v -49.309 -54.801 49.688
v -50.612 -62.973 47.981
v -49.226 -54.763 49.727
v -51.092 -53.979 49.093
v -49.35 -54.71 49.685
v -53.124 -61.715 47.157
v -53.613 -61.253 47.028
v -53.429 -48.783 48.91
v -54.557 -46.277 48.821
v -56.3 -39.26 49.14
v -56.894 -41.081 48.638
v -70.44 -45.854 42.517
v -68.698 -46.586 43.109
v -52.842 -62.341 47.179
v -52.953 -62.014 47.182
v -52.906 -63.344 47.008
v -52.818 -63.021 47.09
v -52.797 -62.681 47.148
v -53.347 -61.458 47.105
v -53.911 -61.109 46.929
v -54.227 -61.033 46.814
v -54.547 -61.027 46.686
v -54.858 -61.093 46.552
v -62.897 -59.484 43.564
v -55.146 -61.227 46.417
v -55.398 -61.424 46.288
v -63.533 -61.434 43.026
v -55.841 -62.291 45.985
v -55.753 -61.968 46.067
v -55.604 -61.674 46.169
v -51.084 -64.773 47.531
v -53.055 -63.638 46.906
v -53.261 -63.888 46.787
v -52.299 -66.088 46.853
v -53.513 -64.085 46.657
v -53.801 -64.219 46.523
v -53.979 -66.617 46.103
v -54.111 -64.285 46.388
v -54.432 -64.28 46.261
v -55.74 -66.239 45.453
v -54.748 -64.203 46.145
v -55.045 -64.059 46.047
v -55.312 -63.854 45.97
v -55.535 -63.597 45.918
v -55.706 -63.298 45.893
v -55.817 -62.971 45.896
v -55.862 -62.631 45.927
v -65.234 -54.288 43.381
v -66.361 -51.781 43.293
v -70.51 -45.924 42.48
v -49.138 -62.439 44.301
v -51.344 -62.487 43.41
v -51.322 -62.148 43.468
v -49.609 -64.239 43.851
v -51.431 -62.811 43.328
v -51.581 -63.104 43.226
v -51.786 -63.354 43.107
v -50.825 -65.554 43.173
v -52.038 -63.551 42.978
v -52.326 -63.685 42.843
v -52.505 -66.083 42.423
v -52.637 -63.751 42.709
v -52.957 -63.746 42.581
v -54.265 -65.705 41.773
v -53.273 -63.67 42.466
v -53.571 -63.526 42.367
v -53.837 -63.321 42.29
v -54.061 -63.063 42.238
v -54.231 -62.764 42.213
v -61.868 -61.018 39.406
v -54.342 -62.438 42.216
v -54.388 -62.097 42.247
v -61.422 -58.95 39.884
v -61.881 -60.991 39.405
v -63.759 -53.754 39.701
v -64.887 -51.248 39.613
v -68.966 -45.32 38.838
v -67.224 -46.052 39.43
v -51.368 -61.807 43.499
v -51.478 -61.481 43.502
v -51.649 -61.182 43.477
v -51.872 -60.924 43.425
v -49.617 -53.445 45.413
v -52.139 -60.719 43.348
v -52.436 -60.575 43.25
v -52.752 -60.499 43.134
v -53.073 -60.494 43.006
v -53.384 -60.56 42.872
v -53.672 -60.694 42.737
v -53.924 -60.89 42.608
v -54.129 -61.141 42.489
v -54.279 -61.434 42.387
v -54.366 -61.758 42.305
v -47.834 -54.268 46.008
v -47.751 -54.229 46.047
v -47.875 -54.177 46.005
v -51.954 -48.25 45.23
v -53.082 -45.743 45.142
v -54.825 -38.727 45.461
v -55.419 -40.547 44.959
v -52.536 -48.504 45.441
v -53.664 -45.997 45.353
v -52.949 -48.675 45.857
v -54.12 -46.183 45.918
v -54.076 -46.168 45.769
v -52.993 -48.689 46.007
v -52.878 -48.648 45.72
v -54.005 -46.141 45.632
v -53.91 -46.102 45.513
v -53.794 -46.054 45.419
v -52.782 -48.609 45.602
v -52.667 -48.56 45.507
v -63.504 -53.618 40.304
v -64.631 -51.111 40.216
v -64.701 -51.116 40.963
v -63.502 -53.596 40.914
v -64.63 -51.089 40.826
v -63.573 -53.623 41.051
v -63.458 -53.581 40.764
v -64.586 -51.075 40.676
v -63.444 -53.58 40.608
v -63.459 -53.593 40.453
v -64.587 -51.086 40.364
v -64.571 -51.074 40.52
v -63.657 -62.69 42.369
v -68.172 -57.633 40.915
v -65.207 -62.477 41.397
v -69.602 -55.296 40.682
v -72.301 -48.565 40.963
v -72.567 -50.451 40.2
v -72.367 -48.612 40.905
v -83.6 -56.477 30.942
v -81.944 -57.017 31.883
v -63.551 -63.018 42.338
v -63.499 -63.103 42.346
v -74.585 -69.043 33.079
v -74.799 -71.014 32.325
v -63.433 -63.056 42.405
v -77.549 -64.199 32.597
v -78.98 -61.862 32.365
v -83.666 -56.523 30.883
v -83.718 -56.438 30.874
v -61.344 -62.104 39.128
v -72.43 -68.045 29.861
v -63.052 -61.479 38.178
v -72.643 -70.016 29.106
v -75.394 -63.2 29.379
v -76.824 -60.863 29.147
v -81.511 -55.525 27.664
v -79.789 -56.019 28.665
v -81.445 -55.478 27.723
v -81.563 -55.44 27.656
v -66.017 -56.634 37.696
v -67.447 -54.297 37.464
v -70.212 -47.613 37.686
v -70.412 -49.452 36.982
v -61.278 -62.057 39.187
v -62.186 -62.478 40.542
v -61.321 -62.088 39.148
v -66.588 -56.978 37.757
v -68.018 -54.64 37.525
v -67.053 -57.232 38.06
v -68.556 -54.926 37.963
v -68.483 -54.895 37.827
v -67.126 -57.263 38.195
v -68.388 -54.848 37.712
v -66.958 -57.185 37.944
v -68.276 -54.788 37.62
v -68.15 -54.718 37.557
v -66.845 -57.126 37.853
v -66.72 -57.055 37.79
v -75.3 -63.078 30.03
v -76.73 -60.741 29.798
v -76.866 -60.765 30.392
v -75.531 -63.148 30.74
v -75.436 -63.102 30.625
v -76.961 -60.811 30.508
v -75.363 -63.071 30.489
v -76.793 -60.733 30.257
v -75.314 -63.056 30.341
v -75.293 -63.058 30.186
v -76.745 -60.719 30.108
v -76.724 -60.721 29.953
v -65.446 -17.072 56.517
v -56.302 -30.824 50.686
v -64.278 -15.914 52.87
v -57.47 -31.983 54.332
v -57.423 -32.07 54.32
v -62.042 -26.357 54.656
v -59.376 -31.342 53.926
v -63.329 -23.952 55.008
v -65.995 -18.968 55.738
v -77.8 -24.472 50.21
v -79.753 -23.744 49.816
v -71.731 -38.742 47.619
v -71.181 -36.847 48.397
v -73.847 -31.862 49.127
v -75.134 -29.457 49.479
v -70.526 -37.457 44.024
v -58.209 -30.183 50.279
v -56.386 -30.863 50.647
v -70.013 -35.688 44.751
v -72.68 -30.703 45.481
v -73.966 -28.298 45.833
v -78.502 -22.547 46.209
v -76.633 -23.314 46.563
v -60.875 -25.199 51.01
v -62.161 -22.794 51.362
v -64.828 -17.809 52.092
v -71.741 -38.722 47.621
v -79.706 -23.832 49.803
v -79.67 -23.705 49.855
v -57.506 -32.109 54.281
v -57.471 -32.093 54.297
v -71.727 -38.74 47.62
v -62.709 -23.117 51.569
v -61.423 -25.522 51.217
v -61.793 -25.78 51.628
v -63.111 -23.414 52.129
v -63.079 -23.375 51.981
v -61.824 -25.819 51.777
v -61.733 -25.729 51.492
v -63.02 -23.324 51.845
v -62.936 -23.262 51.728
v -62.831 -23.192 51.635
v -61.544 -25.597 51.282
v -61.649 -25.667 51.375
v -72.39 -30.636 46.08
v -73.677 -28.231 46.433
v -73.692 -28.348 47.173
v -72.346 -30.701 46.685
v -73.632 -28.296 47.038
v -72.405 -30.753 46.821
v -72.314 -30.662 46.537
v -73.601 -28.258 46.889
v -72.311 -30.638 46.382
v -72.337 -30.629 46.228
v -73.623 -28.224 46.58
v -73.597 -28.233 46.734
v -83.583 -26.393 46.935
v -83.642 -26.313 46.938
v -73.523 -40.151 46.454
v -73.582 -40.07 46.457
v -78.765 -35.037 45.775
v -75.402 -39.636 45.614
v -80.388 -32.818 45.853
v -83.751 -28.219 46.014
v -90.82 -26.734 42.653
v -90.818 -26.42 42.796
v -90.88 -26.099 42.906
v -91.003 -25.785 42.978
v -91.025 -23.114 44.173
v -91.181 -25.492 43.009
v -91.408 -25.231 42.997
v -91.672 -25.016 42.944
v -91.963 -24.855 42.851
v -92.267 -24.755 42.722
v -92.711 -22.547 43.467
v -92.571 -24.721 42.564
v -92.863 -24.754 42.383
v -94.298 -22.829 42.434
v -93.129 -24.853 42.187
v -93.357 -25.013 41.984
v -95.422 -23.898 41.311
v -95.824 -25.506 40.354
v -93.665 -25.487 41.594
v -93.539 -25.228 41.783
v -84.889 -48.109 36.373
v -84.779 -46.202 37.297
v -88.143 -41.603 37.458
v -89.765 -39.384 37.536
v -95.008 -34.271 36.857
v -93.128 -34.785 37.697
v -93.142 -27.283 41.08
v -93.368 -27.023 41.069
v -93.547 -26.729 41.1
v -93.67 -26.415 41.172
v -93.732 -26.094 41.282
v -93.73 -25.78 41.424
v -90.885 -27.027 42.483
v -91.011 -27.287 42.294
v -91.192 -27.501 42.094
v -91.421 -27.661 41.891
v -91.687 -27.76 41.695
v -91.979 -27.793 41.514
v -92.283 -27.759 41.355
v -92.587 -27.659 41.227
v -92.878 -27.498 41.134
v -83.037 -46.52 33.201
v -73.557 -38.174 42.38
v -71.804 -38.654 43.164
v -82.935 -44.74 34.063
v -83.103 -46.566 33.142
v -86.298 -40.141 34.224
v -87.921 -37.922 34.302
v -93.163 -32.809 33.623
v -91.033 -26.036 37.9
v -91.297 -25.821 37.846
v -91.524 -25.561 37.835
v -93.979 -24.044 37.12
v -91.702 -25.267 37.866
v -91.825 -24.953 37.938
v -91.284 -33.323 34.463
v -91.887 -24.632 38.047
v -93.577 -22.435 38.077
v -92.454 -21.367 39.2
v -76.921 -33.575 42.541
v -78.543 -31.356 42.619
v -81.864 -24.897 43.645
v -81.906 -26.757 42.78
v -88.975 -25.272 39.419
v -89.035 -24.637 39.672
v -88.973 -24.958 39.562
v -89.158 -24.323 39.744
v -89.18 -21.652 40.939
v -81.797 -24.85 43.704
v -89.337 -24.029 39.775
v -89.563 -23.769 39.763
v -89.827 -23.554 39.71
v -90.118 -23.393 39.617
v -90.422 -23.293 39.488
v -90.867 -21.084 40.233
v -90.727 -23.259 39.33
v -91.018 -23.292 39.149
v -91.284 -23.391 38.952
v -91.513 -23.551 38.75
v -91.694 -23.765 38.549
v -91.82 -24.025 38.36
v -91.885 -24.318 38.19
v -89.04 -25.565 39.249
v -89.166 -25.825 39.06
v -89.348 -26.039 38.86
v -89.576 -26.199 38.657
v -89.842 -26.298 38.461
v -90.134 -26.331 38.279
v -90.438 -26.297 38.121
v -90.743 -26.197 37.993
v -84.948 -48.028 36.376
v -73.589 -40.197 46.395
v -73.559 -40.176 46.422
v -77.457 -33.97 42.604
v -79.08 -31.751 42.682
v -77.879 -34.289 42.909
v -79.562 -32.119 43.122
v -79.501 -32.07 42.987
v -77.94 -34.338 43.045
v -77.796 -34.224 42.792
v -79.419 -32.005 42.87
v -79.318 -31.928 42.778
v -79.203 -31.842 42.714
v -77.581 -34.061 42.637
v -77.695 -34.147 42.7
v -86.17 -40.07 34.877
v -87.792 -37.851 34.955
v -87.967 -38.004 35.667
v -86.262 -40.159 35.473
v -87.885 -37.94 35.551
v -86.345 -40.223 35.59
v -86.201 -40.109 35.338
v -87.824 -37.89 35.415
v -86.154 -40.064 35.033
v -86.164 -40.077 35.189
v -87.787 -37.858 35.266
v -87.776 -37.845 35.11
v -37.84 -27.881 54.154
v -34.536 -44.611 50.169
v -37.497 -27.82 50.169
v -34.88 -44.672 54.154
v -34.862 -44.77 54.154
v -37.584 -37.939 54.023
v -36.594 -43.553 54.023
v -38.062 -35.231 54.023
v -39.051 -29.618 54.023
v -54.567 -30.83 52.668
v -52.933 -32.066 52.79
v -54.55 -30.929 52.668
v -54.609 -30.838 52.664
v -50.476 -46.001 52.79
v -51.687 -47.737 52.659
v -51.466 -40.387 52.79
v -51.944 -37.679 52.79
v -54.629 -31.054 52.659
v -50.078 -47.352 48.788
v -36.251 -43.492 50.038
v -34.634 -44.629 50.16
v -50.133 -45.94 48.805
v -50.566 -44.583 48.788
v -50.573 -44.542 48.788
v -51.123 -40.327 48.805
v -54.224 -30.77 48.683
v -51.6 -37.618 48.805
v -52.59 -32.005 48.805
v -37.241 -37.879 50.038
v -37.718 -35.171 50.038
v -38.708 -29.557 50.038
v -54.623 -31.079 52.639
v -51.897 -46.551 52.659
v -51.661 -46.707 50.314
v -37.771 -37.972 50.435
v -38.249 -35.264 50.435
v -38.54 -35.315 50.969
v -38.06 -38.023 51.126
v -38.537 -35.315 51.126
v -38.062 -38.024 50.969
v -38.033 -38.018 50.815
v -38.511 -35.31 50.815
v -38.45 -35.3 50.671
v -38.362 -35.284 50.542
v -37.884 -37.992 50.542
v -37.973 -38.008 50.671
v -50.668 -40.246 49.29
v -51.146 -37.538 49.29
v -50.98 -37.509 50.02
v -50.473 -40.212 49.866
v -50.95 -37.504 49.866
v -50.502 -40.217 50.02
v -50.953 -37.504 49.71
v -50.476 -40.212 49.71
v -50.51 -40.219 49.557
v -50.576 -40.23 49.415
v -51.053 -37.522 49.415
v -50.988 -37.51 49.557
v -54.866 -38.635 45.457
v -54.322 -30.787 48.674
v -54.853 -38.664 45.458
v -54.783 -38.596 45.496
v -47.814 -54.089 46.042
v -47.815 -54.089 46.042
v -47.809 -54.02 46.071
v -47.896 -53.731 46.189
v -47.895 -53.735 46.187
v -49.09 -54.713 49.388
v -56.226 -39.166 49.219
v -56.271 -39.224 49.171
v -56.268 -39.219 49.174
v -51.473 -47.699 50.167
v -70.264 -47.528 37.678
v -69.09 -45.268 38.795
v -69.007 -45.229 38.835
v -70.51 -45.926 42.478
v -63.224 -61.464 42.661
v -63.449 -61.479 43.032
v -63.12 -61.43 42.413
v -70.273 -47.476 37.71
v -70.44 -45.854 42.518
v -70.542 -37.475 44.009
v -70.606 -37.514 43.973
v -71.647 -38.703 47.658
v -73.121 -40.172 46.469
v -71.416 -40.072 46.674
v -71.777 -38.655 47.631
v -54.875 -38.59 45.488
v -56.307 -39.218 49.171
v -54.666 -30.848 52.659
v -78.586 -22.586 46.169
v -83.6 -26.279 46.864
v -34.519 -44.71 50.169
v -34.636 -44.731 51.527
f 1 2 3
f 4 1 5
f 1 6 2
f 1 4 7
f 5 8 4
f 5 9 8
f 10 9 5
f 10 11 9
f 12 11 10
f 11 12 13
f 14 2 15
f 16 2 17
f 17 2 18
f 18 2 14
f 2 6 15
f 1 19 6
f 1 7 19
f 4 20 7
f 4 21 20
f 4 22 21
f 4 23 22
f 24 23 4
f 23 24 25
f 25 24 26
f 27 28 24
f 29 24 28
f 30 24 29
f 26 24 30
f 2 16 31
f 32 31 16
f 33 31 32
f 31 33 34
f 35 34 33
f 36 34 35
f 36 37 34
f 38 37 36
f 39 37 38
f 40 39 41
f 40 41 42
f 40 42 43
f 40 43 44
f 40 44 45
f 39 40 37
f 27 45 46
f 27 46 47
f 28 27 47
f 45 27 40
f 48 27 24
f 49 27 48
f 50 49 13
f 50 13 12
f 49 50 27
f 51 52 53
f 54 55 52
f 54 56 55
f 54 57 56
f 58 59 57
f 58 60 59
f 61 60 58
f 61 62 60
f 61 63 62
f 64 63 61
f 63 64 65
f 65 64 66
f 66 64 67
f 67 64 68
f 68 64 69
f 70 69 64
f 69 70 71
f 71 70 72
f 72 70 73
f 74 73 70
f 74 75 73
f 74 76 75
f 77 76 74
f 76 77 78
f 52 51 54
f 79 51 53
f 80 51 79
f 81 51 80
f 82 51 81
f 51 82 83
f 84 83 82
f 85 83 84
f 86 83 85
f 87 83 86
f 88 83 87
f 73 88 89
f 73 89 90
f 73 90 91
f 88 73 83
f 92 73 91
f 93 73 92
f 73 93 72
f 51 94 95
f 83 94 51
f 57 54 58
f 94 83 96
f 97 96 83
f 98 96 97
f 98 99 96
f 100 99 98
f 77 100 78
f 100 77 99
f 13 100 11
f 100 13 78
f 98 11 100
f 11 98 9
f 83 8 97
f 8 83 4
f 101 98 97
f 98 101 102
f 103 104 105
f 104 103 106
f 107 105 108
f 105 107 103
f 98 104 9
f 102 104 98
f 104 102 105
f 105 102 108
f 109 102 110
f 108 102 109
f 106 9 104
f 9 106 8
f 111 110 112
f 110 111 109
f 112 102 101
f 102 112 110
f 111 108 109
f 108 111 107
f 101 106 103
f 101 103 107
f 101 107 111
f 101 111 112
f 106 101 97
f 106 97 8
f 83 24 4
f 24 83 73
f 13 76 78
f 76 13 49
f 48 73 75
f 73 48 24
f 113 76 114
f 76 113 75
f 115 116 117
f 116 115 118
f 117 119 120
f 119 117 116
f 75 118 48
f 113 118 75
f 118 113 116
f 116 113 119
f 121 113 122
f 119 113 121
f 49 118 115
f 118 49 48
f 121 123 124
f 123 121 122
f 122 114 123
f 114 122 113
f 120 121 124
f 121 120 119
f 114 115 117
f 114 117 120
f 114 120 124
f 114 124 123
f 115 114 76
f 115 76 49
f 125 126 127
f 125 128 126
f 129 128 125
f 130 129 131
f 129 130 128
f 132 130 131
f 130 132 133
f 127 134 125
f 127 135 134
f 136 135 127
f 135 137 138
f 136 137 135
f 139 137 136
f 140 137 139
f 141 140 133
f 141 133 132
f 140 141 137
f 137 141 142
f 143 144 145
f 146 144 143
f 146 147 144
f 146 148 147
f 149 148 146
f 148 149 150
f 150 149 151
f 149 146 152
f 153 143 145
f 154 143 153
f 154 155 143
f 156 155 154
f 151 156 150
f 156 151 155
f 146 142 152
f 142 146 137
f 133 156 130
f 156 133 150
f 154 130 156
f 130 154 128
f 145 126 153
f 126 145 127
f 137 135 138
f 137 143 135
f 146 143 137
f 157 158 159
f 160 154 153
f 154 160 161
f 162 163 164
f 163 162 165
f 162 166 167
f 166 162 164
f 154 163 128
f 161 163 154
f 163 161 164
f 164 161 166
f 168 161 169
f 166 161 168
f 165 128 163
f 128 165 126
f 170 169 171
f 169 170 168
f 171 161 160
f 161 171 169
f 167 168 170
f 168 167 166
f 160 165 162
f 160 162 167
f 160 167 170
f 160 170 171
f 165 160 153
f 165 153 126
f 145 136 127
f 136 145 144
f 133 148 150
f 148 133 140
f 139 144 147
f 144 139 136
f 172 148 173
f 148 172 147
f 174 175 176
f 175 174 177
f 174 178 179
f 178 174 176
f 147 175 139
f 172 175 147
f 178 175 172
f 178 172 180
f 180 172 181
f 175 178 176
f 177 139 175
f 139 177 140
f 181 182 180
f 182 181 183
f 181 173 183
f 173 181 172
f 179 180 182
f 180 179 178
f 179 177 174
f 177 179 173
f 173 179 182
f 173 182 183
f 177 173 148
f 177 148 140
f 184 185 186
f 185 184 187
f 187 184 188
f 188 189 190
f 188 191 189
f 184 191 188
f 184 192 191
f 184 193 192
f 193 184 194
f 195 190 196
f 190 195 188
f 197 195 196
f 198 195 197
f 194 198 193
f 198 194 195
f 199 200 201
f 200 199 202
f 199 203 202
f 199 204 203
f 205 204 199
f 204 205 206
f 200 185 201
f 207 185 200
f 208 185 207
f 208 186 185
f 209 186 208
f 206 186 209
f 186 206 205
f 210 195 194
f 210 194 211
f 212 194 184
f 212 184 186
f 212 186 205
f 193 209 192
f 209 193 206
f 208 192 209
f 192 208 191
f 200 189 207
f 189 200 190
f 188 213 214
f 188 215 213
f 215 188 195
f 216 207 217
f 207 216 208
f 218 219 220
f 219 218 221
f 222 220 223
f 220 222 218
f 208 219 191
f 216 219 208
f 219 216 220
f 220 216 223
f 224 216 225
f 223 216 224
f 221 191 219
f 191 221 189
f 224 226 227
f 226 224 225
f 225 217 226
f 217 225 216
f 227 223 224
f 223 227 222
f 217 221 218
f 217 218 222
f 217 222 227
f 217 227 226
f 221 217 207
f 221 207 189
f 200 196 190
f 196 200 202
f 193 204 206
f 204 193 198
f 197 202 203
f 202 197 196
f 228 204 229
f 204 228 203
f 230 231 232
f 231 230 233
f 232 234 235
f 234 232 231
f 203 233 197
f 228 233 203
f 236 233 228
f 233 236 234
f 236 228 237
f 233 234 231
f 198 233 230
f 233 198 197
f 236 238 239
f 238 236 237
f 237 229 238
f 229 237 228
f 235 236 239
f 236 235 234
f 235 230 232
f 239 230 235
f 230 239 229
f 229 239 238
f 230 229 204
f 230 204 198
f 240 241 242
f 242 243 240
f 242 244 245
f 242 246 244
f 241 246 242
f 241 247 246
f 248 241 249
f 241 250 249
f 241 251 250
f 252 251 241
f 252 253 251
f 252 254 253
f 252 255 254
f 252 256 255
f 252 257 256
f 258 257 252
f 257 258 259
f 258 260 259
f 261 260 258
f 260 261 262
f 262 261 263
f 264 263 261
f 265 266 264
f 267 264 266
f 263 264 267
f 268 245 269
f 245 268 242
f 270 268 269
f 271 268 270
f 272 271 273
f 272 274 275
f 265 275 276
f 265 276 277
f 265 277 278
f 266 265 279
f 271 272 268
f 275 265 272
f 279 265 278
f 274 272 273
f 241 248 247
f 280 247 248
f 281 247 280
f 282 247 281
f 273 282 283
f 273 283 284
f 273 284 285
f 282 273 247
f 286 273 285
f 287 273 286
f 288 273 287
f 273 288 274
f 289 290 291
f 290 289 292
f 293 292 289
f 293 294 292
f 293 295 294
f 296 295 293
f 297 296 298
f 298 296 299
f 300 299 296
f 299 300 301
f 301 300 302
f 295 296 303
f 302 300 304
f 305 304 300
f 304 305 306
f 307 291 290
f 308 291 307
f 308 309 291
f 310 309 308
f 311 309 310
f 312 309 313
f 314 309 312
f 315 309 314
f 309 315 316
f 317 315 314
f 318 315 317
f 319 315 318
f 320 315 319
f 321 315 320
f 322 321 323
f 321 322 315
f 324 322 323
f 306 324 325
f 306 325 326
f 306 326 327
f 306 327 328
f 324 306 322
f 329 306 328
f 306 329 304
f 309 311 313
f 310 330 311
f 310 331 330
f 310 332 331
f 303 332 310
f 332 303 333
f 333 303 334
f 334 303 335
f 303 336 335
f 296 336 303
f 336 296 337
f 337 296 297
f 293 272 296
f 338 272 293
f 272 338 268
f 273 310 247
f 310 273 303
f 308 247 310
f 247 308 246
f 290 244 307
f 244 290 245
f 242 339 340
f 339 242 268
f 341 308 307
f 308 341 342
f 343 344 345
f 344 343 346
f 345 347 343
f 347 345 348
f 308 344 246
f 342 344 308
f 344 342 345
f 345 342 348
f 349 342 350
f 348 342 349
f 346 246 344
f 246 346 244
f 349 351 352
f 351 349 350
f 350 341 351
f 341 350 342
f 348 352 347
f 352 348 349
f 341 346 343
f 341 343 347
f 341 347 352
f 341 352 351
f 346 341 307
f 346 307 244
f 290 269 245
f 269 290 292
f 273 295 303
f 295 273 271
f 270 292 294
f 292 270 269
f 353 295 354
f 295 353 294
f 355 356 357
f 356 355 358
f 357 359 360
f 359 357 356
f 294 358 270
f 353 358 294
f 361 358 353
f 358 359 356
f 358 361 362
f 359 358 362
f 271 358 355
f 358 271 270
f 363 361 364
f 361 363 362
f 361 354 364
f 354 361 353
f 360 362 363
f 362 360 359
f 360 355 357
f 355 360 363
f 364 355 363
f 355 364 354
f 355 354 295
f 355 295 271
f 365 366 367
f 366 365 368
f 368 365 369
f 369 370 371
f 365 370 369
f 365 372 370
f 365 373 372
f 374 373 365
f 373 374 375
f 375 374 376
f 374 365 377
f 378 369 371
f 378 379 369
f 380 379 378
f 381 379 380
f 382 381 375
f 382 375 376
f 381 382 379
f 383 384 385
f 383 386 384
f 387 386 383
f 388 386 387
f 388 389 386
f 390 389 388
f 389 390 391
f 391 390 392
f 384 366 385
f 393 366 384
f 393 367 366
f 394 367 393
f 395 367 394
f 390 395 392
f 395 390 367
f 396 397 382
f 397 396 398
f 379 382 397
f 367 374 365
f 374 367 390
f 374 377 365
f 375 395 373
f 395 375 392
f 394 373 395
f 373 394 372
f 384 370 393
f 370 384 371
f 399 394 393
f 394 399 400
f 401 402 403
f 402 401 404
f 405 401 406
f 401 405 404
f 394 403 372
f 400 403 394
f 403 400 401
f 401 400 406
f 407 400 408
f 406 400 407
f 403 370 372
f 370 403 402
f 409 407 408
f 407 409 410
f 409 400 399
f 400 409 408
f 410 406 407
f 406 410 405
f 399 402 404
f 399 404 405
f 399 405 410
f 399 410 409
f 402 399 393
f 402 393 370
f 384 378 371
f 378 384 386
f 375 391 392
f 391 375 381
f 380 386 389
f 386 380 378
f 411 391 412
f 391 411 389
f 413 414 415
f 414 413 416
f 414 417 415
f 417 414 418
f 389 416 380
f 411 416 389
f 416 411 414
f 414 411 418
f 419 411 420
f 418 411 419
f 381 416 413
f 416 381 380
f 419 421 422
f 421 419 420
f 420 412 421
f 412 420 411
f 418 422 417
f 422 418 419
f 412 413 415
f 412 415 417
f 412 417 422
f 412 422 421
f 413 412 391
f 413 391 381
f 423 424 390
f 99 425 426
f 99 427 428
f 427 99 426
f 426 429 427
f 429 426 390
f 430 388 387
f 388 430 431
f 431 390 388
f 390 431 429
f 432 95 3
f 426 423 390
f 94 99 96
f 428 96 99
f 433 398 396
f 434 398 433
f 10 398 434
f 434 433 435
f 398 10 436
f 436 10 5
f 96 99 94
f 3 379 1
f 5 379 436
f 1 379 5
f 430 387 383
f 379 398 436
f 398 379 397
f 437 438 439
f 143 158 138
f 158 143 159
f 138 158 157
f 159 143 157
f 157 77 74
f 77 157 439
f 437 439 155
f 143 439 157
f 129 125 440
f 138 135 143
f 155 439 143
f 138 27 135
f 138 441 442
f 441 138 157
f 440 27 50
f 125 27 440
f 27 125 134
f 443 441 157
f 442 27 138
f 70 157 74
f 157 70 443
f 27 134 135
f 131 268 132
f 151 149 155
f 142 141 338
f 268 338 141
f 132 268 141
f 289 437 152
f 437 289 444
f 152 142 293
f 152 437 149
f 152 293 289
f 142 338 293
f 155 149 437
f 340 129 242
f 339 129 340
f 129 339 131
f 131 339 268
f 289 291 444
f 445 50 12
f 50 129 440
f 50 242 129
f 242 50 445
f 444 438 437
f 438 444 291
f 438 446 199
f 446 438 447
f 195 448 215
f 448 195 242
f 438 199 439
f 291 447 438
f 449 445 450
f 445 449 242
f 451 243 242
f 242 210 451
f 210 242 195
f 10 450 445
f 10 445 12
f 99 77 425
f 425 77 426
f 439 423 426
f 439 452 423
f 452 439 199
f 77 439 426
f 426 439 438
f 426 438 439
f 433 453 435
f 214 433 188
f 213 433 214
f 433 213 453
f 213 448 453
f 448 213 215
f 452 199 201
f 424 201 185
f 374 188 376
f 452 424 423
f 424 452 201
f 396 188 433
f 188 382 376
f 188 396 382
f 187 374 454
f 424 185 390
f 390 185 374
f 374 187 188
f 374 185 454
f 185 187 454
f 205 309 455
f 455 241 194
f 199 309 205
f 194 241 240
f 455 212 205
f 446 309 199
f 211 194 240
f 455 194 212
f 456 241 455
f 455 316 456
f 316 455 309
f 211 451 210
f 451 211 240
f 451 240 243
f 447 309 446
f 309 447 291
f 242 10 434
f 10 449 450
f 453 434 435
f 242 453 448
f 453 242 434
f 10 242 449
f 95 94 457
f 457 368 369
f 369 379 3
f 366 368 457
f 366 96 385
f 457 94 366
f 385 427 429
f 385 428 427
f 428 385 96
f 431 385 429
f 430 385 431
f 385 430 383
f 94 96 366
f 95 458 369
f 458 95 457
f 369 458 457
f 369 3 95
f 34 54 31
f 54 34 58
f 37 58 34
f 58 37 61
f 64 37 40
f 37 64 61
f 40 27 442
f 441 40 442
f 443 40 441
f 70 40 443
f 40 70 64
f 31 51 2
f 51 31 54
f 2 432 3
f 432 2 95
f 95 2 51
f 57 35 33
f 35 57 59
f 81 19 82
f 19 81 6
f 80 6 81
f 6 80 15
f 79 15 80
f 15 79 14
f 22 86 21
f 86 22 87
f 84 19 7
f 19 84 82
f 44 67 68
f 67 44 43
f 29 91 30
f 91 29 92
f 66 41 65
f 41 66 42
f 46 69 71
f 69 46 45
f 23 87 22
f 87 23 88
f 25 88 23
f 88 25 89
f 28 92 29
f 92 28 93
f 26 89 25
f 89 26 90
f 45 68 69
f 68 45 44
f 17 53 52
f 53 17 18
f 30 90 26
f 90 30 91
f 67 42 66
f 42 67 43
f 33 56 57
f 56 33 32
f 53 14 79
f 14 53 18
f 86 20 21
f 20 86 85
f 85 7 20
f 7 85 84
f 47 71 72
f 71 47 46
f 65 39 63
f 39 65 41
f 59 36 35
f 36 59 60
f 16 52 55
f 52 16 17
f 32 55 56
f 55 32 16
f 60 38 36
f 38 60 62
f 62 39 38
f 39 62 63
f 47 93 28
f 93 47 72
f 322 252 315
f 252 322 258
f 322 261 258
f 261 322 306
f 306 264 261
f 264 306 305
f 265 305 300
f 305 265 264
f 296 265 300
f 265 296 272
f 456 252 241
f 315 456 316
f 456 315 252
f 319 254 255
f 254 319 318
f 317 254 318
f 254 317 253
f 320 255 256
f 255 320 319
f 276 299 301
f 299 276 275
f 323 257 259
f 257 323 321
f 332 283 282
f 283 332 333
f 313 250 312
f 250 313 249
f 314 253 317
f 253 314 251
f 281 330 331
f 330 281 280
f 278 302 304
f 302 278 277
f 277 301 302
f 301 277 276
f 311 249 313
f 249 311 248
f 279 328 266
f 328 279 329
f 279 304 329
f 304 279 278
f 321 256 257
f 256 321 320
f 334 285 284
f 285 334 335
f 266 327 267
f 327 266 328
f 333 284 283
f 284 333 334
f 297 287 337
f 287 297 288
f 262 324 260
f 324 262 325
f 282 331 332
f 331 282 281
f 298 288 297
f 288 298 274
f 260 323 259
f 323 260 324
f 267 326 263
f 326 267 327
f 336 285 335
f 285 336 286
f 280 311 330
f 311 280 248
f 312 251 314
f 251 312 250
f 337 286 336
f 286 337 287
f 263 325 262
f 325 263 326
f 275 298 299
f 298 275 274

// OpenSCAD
union () {
  union () {
    union () {
      union () {
        translate ([-22, -36, -3]) {
          translate ([-36.42059678255161, -13.748592644796744, 45.42143047760381]) {
            rotate (a=25.0, v=[0, 0, 1]) {
              rotate (a=-23.000000000000004, v=[0, 1, 0]) {
                rotate (a=-1.9999999999999998, v=[1, 0, 0]) {
                  union () {
                    union () {
                      translate ([0, 7.825, 2]) {
                        cube ([17.15, 1.5, 4], center=true);
                      }
                      translate ([7.825, 0, 2]) {
                        cube ([1.5, 17.15, 4], center=true);
                      }
                      translate ([0, 0, 0]) {
                        hull () {
                          translate ([7.825, 0, 2]) {
                            cube ([1.5, 2.75, 4], center=true);
                          }
                          translate ([7.075, 0, 1]) {
                            rotate (a=90.0, v=[1, 0, 0]) {
                              cylinder ($fn=30, h=2.75, r=0.75, center=true);
                            }
                          }
                        }
                      }
                    }
                    mirror ([0, 1, 0]) {
                      mirror ([1, 0, 0]) {
                        union () {
                          translate ([0, 7.825, 2]) {
                            cube ([17.15, 1.5, 4], center=true);
                          }
                          translate ([7.825, 0, 2]) {
                            cube ([1.5, 17.15, 4], center=true);
                          }
                          translate ([0, 0, 0]) {
                            hull () {
                              translate ([7.825, 0, 2]) {
                                cube ([1.5, 2.75, 4], center=true);
                              }
                              translate ([7.075, 0, 1]) {
                                rotate (a=90.0, v=[1, 0, 0]) {
                                  cylinder ($fn=30, h=2.75, r=0.75, center=true);
                                }
                              }
                            }
                          }
                        }
                      }
                    }
                  }
                }
              }
            }
          }
        }
        translate ([-35, -45, -12]) {
          translate ([-36.42059678255161, -13.748592644796744, 45.42143047760381]) {
            rotate (a=34.99999999999999, v=[0, 0, 1]) {
              rotate (a=-36.0, v=[0, 1, 0]) {
                rotate (a=-6.0, v=[1, 0, 0]) {
                  union () {
                    union () {
                      translate ([0, 7.825, 2]) {
                        cube ([17.15, 1.5, 4], center=true);
                      }
                      translate ([7.825, 0, 2]) {
                        cube ([1.5, 17.15, 4], center=true);
                      }
                      translate ([0, 0, 0]) {
                        hull () {
                          translate ([7.825, 0, 2]) {
                            cube ([1.5, 2.75, 4], center=true);
                          }
                          translate ([7.075, 0, 1]) {
                            rotate (a=90.0, v=[1, 0, 0]) {
                              cylinder ($fn=30, h=2.75, r=0.75, center=true);
                            }
                          }
                        }
                      }
                    }
                    mirror ([0, 1, 0]) {
                      mirror ([1, 0, 0]) {
                        union () {
                          translate ([0, 7.825, 2]) {
                            cube ([17.15, 1.5, 4], center=true);
                          }
                          translate ([7.825, 0, 2]) {
                            cube ([1.5, 17.15, 4], center=true);
                          }
                          translate ([0, 0, 0]) {
                            hull () {
                              translate ([7.825, 0, 2]) {
                                cube ([1.5, 2.75, 4], center=true);
                              }
                              translate ([7.075, 0, 1]) {
                                rotate (a=90.0, v=[1, 0, 0]) {
                                  cylinder ($fn=30, h=2.75, r=0.75, center=true);
                                }
                              }
                            }
                          }
                        }
                      }
                    }
                  }
                }
              }
            }
          }
        }
        translate ([-31, -13, 3]) {
          translate ([-36.42059678255161, -13.748592644796744, 45.42143047760381]) {
            rotate (a=25.0, v=[0, 0, 1]) {
              rotate (a=-23.000000000000004, v=[0, 1, 0]) {
                rotate (a=7.999999999999999, v=[1, 0, 0]) {
                  union () {
                    union () {
                      translate ([0, 7.825, 2]) {
                        cube ([17.15, 1.5, 4], center=true);
                      }
                      translate ([7.825, 0, 2]) {
                        cube ([1.5, 17.15, 4], center=true);
                      }
                      translate ([0, 0, 0]) {
                        hull () {
                          translate ([7.825, 0, 2]) {
                            cube ([1.5, 2.75, 4], center=true);
                          }
                          translate ([7.075, 0, 1]) {
                            rotate (a=90.0, v=[1, 0, 0]) {
                              cylinder ($fn=30, h=2.75, r=0.75, center=true);
                            }
                          }
                        }
                      }
                    }
                    mirror ([0, 1, 0]) {
                      mirror ([1, 0, 0]) {
                        union () {
                          translate ([0, 7.825, 2]) {
                            cube ([17.15, 1.5, 4], center=true);
                          }
                          translate ([7.825, 0, 2]) {
                            cube ([1.5, 17.15, 4], center=true);
                          }
                          translate ([0, 0, 0]) {
                            hull () {
                              translate ([7.825, 0, 2]) {
                                cube ([1.5, 2.75, 4], center=true);
                              }
                              translate ([7.075, 0, 1]) {
                                rotate (a=90.0, v=[1, 0, 0]) {
                                  cylinder ($fn=30, h=2.75, r=0.75, center=true);
                                }
                              }
                            }
                          }
                        }
                      }
                    }
                  }
                }
              }
            }
          }
        }
        translate ([-46, -22, -7]) {
          translate ([-36.42059678255161, -13.748592644796744, 45.42143047760381]) {
            rotate (a=34.99999999999999, v=[0, 0, 1]) {
              rotate (a=-36.0, v=[0, 1, 0]) {
                rotate (a=1.9999999999999998, v=[1, 0, 0]) {
                  union () {
                    union () {
                      translate ([0, 7.825, 2]) {
                        cube ([17.15, 1.5, 4], center=true);
                      }
                      translate ([7.825, 0, 2]) {
                        cube ([1.5, 17.15, 4], center=true);
                      }
                      translate ([0, 0, 0]) {
                        hull () {
                          translate ([7.825, 0, 2]) {
                            cube ([1.5, 2.75, 4], center=true);
                          }
                          translate ([7.075, 0, 1]) {
                            rotate (a=90.0, v=[1, 0, 0]) {
                              cylinder ($fn=30, h=2.75, r=0.75, center=true);
                            }
                          }
                        }
                      }
                    }
                    mirror ([0, 1, 0]) {
                      mirror ([1, 0, 0]) {
                        union () {
                          translate ([0, 7.825, 2]) {
                            cube ([17.15, 1.5, 4], center=true);
                          }
                          translate ([7.825, 0, 2]) {
                            cube ([1.5, 17.15, 4], center=true);
                          }
                          translate ([0, 0, 0]) {
                            hull () {
                              translate ([7.825, 0, 2]) {
                                cube ([1.5, 2.75, 4], center=true);
                              }
                              translate ([7.075, 0, 1]) {
                                rotate (a=90.0, v=[1, 0, 0]) {
                                  cylinder ($fn=30, h=2.75, r=0.75, center=true);
                                }
                              }
                            }
                          }
                        }
                      }
                    }
                  }
                }
              }
            }
          }
        }
      }
      union () {
        translate ([-8, -24, 4]) {
          translate ([-36.42059678255161, -13.748592644796744, 45.42143047760381]) {
            rotate (a=10.000000000000002, v=[0, 0, 1]) {
              rotate (a=-5.000000000000001, v=[0, 1, 0]) {
                rotate (a=0.0, v=[1, 0, 0]) {
                  union () {
                    union () {
                      translate ([0, 7.825, 2]) {
                        cube ([17.15, 1.5, 4], center=true);
                      }
                      translate ([7.825, 0, 2]) {
                        cube ([1.5, 17.15, 4], center=true);
                      }
                      translate ([0, 0, 0]) {
                        hull () {
                          translate ([7.825, 0, 2]) {
                            cube ([1.5, 2.75, 4], center=true);
                          }
                          translate ([7.075, 0, 1]) {
                            rotate (a=90.0, v=[1, 0, 0]) {
                              cylinder ($fn=30, h=2.75, r=0.75, center=true);
                            }
                          }
                        }
                      }
                    }
                    mirror ([0, 1, 0]) {
                      mirror ([1, 0, 0]) {
                        union () {
                          translate ([0, 7.825, 2]) {
                            cube ([17.15, 1.5, 4], center=true);
                          }
                          translate ([7.825, 0, 2]) {
                            cube ([1.5, 17.15, 4], center=true);
                          }
                          translate ([0, 0, 0]) {
                            hull () {
                              translate ([7.825, 0, 2]) {
                                cube ([1.5, 2.75, 4], center=true);
                              }
                              translate ([7.075, 0, 1]) {
                                rotate (a=90.0, v=[1, 0, 0]) {
                                  cylinder ($fn=30, h=2.75, r=0.75, center=true);
                                }
                              }
                            }
                          }
                        }
                      }
                    }
                  }
                }
              }
            }
          }
        }
      }
    }
    union () {
      union () {
        hull () {
          translate ([-22, -36, -3]) {
            translate ([-36.42059678255161, -13.748592644796744, 45.42143047760381]) {
              rotate (a=25.0, v=[0, 0, 1]) {
                rotate (a=-23.000000000000004, v=[0, 1, 0]) {
                  rotate (a=-1.9999999999999998, v=[1, 0, 0]) {
                    translate ([8.524999999999999, 8.524999999999999, 0]) {
                      translate ([0, 0, 2]) {
                        cube ([0.1, 0.1, 4], center=true);
                      }
                    }
                  }
                }
              }
            }
          }
          translate ([-22, -36, -3]) {
            translate ([-36.42059678255161, -13.748592644796744, 45.42143047760381]) {
              rotate (a=25.0, v=[0, 0, 1]) {
                rotate (a=-23.000000000000004, v=[0, 1, 0]) {
                  rotate (a=-1.9999999999999998, v=[1, 0, 0]) {
                    translate ([8.524999999999999, -8.524999999999999, 0]) {
                      translate ([0, 0, 2]) {
                        cube ([0.1, 0.1, 4], center=true);
                      }
                    }
                  }
                }
              }
            }
          }
          translate ([-8, -24, 4]) {
            translate ([-36.42059678255161, -13.748592644796744, 45.42143047760381]) {
              rotate (a=10.000000000000002, v=[0, 0, 1]) {
                rotate (a=-5.000000000000001, v=[0, 1, 0]) {
                  rotate (a=0.0, v=[1, 0, 0]) {
                    translate ([-8.524999999999999, 8.524999999999999, 0]) {
                      translate ([0, 0, 2]) {
                        cube ([0.1, 0.1, 4], center=true);
                      }
                    }
                  }
                }
              }
            }
          }
        }
        hull () {
          translate ([-22, -36, -3]) {
            translate ([-36.42059678255161, -13.748592644796744, 45.42143047760381]) {
              rotate (a=25.0, v=[0, 0, 1]) {
                rotate (a=-23.000000000000004, v=[0, 1, 0]) {
                  rotate (a=-1.9999999999999998, v=[1, 0, 0]) {
                    translate ([8.524999999999999, -8.524999999999999, 0]) {
                      translate ([0, 0, 2]) {
                        cube ([0.1, 0.1, 4], center=true);
                      }
                    }
                  }
                }
              }
            }
          }
          translate ([-8, -24, 4]) {
            translate ([-36.42059678255161, -13.748592644796744, 45.42143047760381]) {
              rotate (a=10.000000000000002, v=[0, 0, 1]) {
                rotate (a=-5.000000000000001, v=[0, 1, 0]) {
                  rotate (a=0.0, v=[1, 0, 0]) {
                    translate ([-8.524999999999999, 8.524999999999999, 0]) {
                      translate ([0, 0, 2]) {
                        cube ([0.1, 0.1, 4], center=true);
                      }
                    }
                  }
                }
              }
            }
          }
          translate ([-8, -24, 4]) {
            translate ([-36.42059678255161, -13.748592644796744, 45.42143047760381]) {
              rotate (a=10.000000000000002, v=[0, 0, 1]) {
                rotate (a=-5.000000000000001, v=[0, 1, 0]) {
                  rotate (a=0.0, v=[1, 0, 0]) {
                    translate ([-8.524999999999999, -8.524999999999999, 0]) {
                      translate ([0, 0, 2]) {
                        cube ([0.1, 0.1, 4], center=true);
                      }
                    }
                  }
                }
              }
            }
          }
        }
      }
      union () {
        hull () {
          translate ([-35, -45, -12]) {
            translate ([-36.42059678255161, -13.748592644796744, 45.42143047760381]) {
              rotate (a=34.99999999999999, v=[0, 0, 1]) {
                rotate (a=-36.0, v=[0, 1, 0]) {
                  rotate (a=-6.0, v=[1, 0, 0]) {
                    translate ([8.524999999999999, 8.524999999999999, 0]) {
                      translate ([0, 0, 2]) {
                        cube ([0.1, 0.1, 4], center=true);
                      }
                    }
                  }
                }
              }
            }
          }
          translate ([-35, -45, -12]) {
            translate ([-36.42059678255161, -13.748592644796744, 45.42143047760381]) {
              rotate (a=34.99999999999999, v=[0, 0, 1]) {
                rotate (a=-36.0, v=[0, 1, 0]) {
                  rotate (a=-6.0, v=[1, 0, 0]) {
                    translate ([8.524999999999999, -8.524999999999999, 0]) {
                      translate ([0, 0, 2]) {
                        cube ([0.1, 0.1, 4], center=true);
                      }
                    }
                  }
                }
              }
            }
          }
          translate ([-22, -36, -3]) {
            translate ([-36.42059678255161, -13.748592644796744, 45.42143047760381]) {
              rotate (a=25.0, v=[0, 0, 1]) {
                rotate (a=-23.000000000000004, v=[0, 1, 0]) {
                  rotate (a=-1.9999999999999998, v=[1, 0, 0]) {
                    translate ([-8.524999999999999, 8.524999999999999, 0]) {
                      translate ([0, 0, 2]) {
                        cube ([0.1, 0.1, 4], center=true);
                      }
                    }
                  }
                }
              }
            }
          }
        }
        hull () {
          translate ([-35, -45, -12]) {
            translate ([-36.42059678255161, -13.748592644796744, 45.42143047760381]) {
              rotate (a=34.99999999999999, v=[0, 0, 1]) {
                rotate (a=-36.0, v=[0, 1, 0]) {
                  rotate (a=-6.0, v=[1, 0, 0]) {
                    translate ([8.524999999999999, -8.524999999999999, 0]) {
                      translate ([0, 0, 2]) {
                        cube ([0.1, 0.1, 4], center=true);
                      }
                    }
                  }
                }
              }
            }
          }
          translate ([-22, -36, -3]) {
            translate ([-36.42059678255161, -13.748592644796744, 45.42143047760381]) {
              rotate (a=25.0, v=[0, 0, 1]) {
                rotate (a=-23.000000000000004, v=[0, 1, 0]) {
                  rotate (a=-1.9999999999999998, v=[1, 0, 0]) {
                    translate ([-8.524999999999999, 8.524999999999999, 0]) {
                      translate ([0, 0, 2]) {
                        cube ([0.1, 0.1, 4], center=true);
                      }
                    }
                  }
                }
              }
            }
          }
          translate ([-22, -36, -3]) {
            translate ([-36.42059678255161, -13.748592644796744, 45.42143047760381]) {
              rotate (a=25.0, v=[0, 0, 1]) {
                rotate (a=-23.000000000000004, v=[0, 1, 0]) {
                  rotate (a=-1.9999999999999998, v=[1, 0, 0]) {
                    translate ([-8.524999999999999, -8.524999999999999, 0]) {
                      translate ([0, 0, 2]) {
                        cube ([0.1, 0.1, 4], center=true);
                      }
                    }
                  }
                }
              }
            }
          }
        }
      }
      union () {
        hull () {
          translate ([-22, -36, -3]) {
            translate ([-36.42059678255161, -13.748592644796744, 45.42143047760381]) {
              rotate (a=25.0, v=[0, 0, 1]) {
                rotate (a=-23.000000000000004, v=[0, 1, 0]) {
                  rotate (a=-1.9999999999999998, v=[1, 0, 0]) {
                    translate ([8.524999999999999, -8.524999999999999, 0]) {
                      translate ([0, 0, 2]) {
                        cube ([0.1, 0.1, 4], center=true);
                      }
                    }
                  }
                }
              }
            }
          }
          translate ([-8, -24, 4]) {
            translate ([-36.42059678255161, -13.748592644796744, 45.42143047760381]) {
              rotate (a=10.000000000000002, v=[0, 0, 1]) {
                rotate (a=-5.000000000000001, v=[0, 1, 0]) {
                  rotate (a=0.0, v=[1, 0, 0]) {
                    translate ([-8.524999999999999, -8.524999999999999, 0]) {
                      translate ([0, 0, 2]) {
                        cube ([0.1, 0.1, 4], center=true);
                      }
                    }
                  }
                }
              }
            }
          }
          translate ([-8, -24, 4]) {
            translate ([-36.42059678255161, -13.748592644796744, 45.42143047760381]) {
              rotate (a=10.000000000000002, v=[0, 0, 1]) {
                rotate (a=-5.000000000000001, v=[0, 1, 0]) {
                  rotate (a=0.0, v=[1, 0, 0]) {
                    translate ([8.524999999999999, -8.524999999999999, 0]) {
                      translate ([0, 0, 2]) {
                        cube ([0.1, 0.1, 4], center=true);
                      }
                    }
                  }
                }
              }
            }
          }
        }
      }
      union () {
        hull () {
          translate ([-35, -45, -12]) {
            translate ([-36.42059678255161, -13.748592644796744, 45.42143047760381]) {
              rotate (a=34.99999999999999, v=[0, 0, 1]) {
                rotate (a=-36.0, v=[0, 1, 0]) {
                  rotate (a=-6.0, v=[1, 0, 0]) {
                    translate ([-8.524999999999999, 8.524999999999999, 0]) {
                      translate ([0, 0, 2]) {
                        cube ([0.1, 0.1, 4], center=true);
                      }
                    }
                  }
                }
              }
            }
          }
          translate ([-46, -22, -7]) {
            translate ([-36.42059678255161, -13.748592644796744, 45.42143047760381]) {
              rotate (a=34.99999999999999, v=[0, 0, 1]) {
                rotate (a=-36.0, v=[0, 1, 0]) {
                  rotate (a=1.9999999999999998, v=[1, 0, 0]) {
                    translate ([-8.524999999999999, -8.524999999999999, 0]) {
                      translate ([0, 0, 2]) {
                        cube ([0.1, 0.1, 4], center=true);
                      }
                    }
                  }
                }
              }
            }
          }
          translate ([-35, -45, -12]) {
            translate ([-36.42059678255161, -13.748592644796744, 45.42143047760381]) {
              rotate (a=34.99999999999999, v=[0, 0, 1]) {
                rotate (a=-36.0, v=[0, 1, 0]) {
                  rotate (a=-6.0, v=[1, 0, 0]) {
                    translate ([8.524999999999999, 8.524999999999999, 0]) {
                      translate ([0, 0, 2]) {
                        cube ([0.1, 0.1, 4], center=true);
                      }
                    }
                  }
                }
              }
            }
          }
        }
        hull () {
          translate ([-46, -22, -7]) {
            translate ([-36.42059678255161, -13.748592644796744, 45.42143047760381]) {
              rotate (a=34.99999999999999, v=[0, 0, 1]) {
                rotate (a=-36.0, v=[0, 1, 0]) {
                  rotate (a=1.9999999999999998, v=[1, 0, 0]) {
                    translate ([-8.524999999999999, -8.524999999999999, 0]) {
                      translate ([0, 0, 2]) {
                        cube ([0.1, 0.1, 4], center=true);
                      }
                    }
                  }
                }
              }
            }
          }
          translate ([-35, -45, -12]) {
            translate ([-36.42059678255161, -13.748592644796744, 45.42143047760381]) {
              rotate (a=34.99999999999999, v=[0, 0, 1]) {
                rotate (a=-36.0, v=[0, 1, 0]) {
                  rotate (a=-6.0, v=[1, 0, 0]) {
                    translate ([8.524999999999999, 8.524999999999999, 0]) {
                      translate ([0, 0, 2]) {
                        cube ([0.1, 0.1, 4], center=true);
                      }
                    }
                  }
                }
              }
            }
          }
          translate ([-46, -22, -7]) {
            translate ([-36.42059678255161, -13.748592644796744, 45.42143047760381]) {
              rotate (a=34.99999999999999, v=[0, 0, 1]) {
                rotate (a=-36.0, v=[0, 1, 0]) {
                  rotate (a=1.9999999999999998, v=[1, 0, 0]) {
                    translate ([8.524999999999999, -8.524999999999999, 0]) {
                      translate ([0, 0, 2]) {
                        cube ([0.1, 0.1, 4], center=true);
                      }
                    }
                  }
                }
              }
            }
          }
        }
        hull () {
          translate ([-35, -45, -12]) {
            translate ([-36.42059678255161, -13.748592644796744, 45.42143047760381]) {
              rotate (a=34.99999999999999, v=[0, 0, 1]) {
                rotate (a=-36.0, v=[0, 1, 0]) {
                  rotate (a=-6.0, v=[1, 0, 0]) {
                    translate ([8.524999999999999, 8.524999999999999, 0]) {
                      translate ([0, 0, 2]) {
                        cube ([0.1, 0.1, 4], center=true);
                      }
                    }
                  }
                }
              }
            }
          }
          translate ([-46, -22, -7]) {
            translate ([-36.42059678255161, -13.748592644796744, 45.42143047760381]) {
              rotate (a=34.99999999999999, v=[0, 0, 1]) {
                rotate (a=-36.0, v=[0, 1, 0]) {
                  rotate (a=1.9999999999999998, v=[1, 0, 0]) {
                    translate ([8.524999999999999, -8.524999999999999, 0]) {
                      translate ([0, 0, 2]) {
                        cube ([0.1, 0.1, 4], center=true);
                      }
                    }
                  }
                }
              }
            }
          }
          translate ([-22, -36, -3]) {
            translate ([-36.42059678255161, -13.748592644796744, 45.42143047760381]) {
              rotate (a=25.0, v=[0, 0, 1]) {
                rotate (a=-23.000000000000004, v=[0, 1, 0]) {
                  rotate (a=-1.9999999999999998, v=[1, 0, 0]) {
                    translate ([-8.524999999999999, 8.524999999999999, 0]) {
                      translate ([0, 0, 2]) {
                        cube ([0.1, 0.1, 4], center=true);
                      }
                    }
                  }
                }
              }
            }
          }
        }
        hull () {
          translate ([-46, -22, -7]) {
            translate ([-36.42059678255161, -13.748592644796744, 45.42143047760381]) {
              rotate (a=34.99999999999999, v=[0, 0, 1]) {
                rotate (a=-36.0, v=[0, 1, 0]) {
                  rotate (a=1.9999999999999998, v=[1, 0, 0]) {
                    translate ([8.524999999999999, -8.524999999999999, 0]) {
                      translate ([0, 0, 2]) {
                        cube ([0.1, 0.1, 4], center=true);
                      }
                    }
                  }
                }
              }
            }
          }
          translate ([-22, -36, -3]) {
            translate ([-36.42059678255161, -13.748592644796744, 45.42143047760381]) {
              rotate (a=25.0, v=[0, 0, 1]) {
                rotate (a=-23.000000000000004, v=[0, 1, 0]) {
                  rotate (a=-1.9999999999999998, v=[1, 0, 0]) {
                    translate ([-8.524999999999999, 8.524999999999999, 0]) {
                      translate ([0, 0, 2]) {
                        cube ([0.1, 0.1, 4], center=true);
                      }
                    }
                  }
                }
              }
            }
          }
          translate ([-31, -13, 3]) {
            translate ([-36.42059678255161, -13.748592644796744, 45.42143047760381]) {
              rotate (a=25.0, v=[0, 0, 1]) {
                rotate (a=-23.000000000000004, v=[0, 1, 0]) {
                  rotate (a=7.999999999999999, v=[1, 0, 0]) {
                    translate ([-8.524999999999999, -8.524999999999999, 0]) {
                      translate ([0, 0, 2]) {
                        cube ([0.1, 0.1, 4], center=true);
                      }
                    }
                  }
                }
              }
            }
          }
        }
        hull () {
          translate ([-22, -36, -3]) {
            translate ([-36.42059678255161, -13.748592644796744, 45.42143047760381]) {
              rotate (a=25.0, v=[0, 0, 1]) {
                rotate (a=-23.000000000000004, v=[0, 1, 0]) {
                  rotate (a=-1.9999999999999998, v=[1, 0, 0]) {
                    translate ([-8.524999999999999, 8.524999999999999, 0]) {
                      translate ([0, 0, 2]) {
                        cube ([0.1, 0.1, 4], center=true);
                      }
                    }
                  }
                }
              }
            }
          }
          translate ([-31, -13, 3]) {
            translate ([-36.42059678255161, -13.748592644796744, 45.42143047760381]) {
              rotate (a=25.0, v=[0, 0, 1]) {
                rotate (a=-23.000000000000004, v=[0, 1, 0]) {
                  rotate (a=7.999999999999999, v=[1, 0, 0]) {
                    translate ([-8.524999999999999, -8.524999999999999, 0]) {
                      translate ([0, 0, 2]) {
                        cube ([0.1, 0.1, 4], center=true);
                      }
                    }
                  }
                }
              }
            }
          }
          translate ([-22, -36, -3]) {
            translate ([-36.42059678255161, -13.748592644796744, 45.42143047760381]) {
              rotate (a=25.0, v=[0, 0, 1]) {
                rotate (a=-23.000000000000004, v=[0, 1, 0]) {
                  rotate (a=-1.9999999999999998, v=[1, 0, 0]) {
                    translate ([8.524999999999999, 8.524999999999999, 0]) {
                      translate ([0, 0, 2]) {
                        cube ([0.1, 0.1, 4], center=true);
                      }
                    }
                  }
                }
              }
            }
          }
        }
        hull () {
          translate ([-31, -13, 3]) {
            translate ([-36.42059678255161, -13.748592644796744, 45.42143047760381]) {
              rotate (a=25.0, v=[0, 0, 1]) {
                rotate (a=-23.000000000000004, v=[0, 1, 0]) {
                  rotate (a=7.999999999999999, v=[1, 0, 0]) {
                    translate ([-8.524999999999999, -8.524999999999999, 0]) {
                      translate ([0, 0, 2]) {
                        cube ([0.1, 0.1, 4], center=true);
                      }
                    }
                  }
                }
              }
            }
          }
          translate ([-22, -36, -3]) {
            translate ([-36.42059678255161, -13.748592644796744, 45.42143047760381]) {
              rotate (a=25.0, v=[0, 0, 1]) {
                rotate (a=-23.000000000000004, v=[0, 1, 0]) {
                  rotate (a=-1.9999999999999998, v=[1, 0, 0]) {
                    translate ([8.524999999999999, 8.524999999999999, 0]) {
                      translate ([0, 0, 2]) {
                        cube ([0.1, 0.1, 4], center=true);
                      }
                    }
                  }
                }
              }
            }
          }
          translate ([-31, -13, 3]) {
            translate ([-36.42059678255161, -13.748592644796744, 45.42143047760381]) {
              rotate (a=25.0, v=[0, 0, 1]) {
                rotate (a=-23.000000000000004, v=[0, 1, 0]) {
                  rotate (a=7.999999999999999, v=[1, 0, 0]) {
                    translate ([8.524999999999999, -8.524999999999999, 0]) {
                      translate ([0, 0, 2]) {
                        cube ([0.1, 0.1, 4], center=true);
                      }
                    }
                  }
                }
              }
            }
          }
        }
        hull () {
          translate ([-22, -36, -3]) {
            translate ([-36.42059678255161, -13.748592644796744, 45.42143047760381]) {
              rotate (a=25.0, v=[0, 0, 1]) {
                rotate (a=-23.000000000000004, v=[0, 1, 0]) {
                  rotate (a=-1.9999999999999998, v=[1, 0, 0]) {
                    translate ([8.524999999999999, 8.524999999999999, 0]) {
                      translate ([0, 0, 2]) {
                        cube ([0.1, 0.1, 4], center=true);
                      }
                    }
                  }
                }
              }
            }
          }
          translate ([-31, -13, 3]) {
            translate ([-36.42059678255161, -13.748592644796744, 45.42143047760381]) {
              rotate (a=25.0, v=[0, 0, 1]) {
                rotate (a=-23.000000000000004, v=[0, 1, 0]) {
                  rotate (a=7.999999999999999, v=[1, 0, 0]) {
                    translate ([8.524999999999999, -8.524999999999999, 0]) {
                      translate ([0, 0, 2]) {
                        cube ([0.1, 0.1, 4], center=true);
                      }
                    }
                  }
                }
              }
            }
          }
          translate ([-22, -36, -3]) {
            translate ([-36.42059678255161, -13.748592644796744, 45.42143047760381]) {
              rotate (a=25.0, v=[0, 0, 1]) {
                rotate (a=-23.000000000000004, v=[0, 1, 0]) {
                  rotate (a=-1.9999999999999998, v=[1, 0, 0]) {
                    translate ([8.524999999999999, 8.524999999999999, 0]) {
                      translate ([0, 0, 2]) {
                        cube ([0.1, 0.1, 4], center=true);
                      }
                    }
                  }
                }
              }
            }
          }
        }
        hull () {
          translate ([-31, -13, 3]) {
            translate ([-36.42059678255161, -13.748592644796744, 45.42143047760381]) {
              rotate (a=25.0, v=[0, 0, 1]) {
                rotate (a=-23.000000000000004, v=[0, 1, 0]) {
                  rotate (a=7.999999999999999, v=[1, 0, 0]) {
                    translate ([8.524999999999999, -8.524999999999999, 0]) {
                      translate ([0, 0, 2]) {
                        cube ([0.1, 0.1, 4], center=true);
                      }
                    }
                  }
                }
              }
            }
          }
          translate ([-22, -36, -3]) {
            translate ([-36.42059678255161, -13.748592644796744, 45.42143047760381]) {
              rotate (a=25.0, v=[0, 0, 1]) {
                rotate (a=-23.000000000000004, v=[0, 1, 0]) {
                  rotate (a=-1.9999999999999998, v=[1, 0, 0]) {
                    translate ([8.524999999999999, 8.524999999999999, 0]) {
                      translate ([0, 0, 2]) {
                        cube ([0.1, 0.1, 4], center=true);
                      }
                    }
                  }
                }
              }
            }
          }
          translate ([-8, -24, 4]) {
            translate ([-36.42059678255161, -13.748592644796744, 45.42143047760381]) {
              rotate (a=10.000000000000002, v=[0, 0, 1]) {
                rotate (a=-5.000000000000001, v=[0, 1, 0]) {
                  rotate (a=0.0, v=[1, 0, 0]) {
                    translate ([-8.524999999999999, 8.524999999999999, 0]) {
                      translate ([0, 0, 2]) {
                        cube ([0.1, 0.1, 4], center=true);
                      }
                    }
                  }
                }
              }
            }
          }
        }
      }
      union () {
        hull () {
          translate ([-31, -13, 3]) {
            translate ([-36.42059678255161, -13.748592644796744, 45.42143047760381]) {
              rotate (a=25.0, v=[0, 0, 1]) {
                rotate (a=-23.000000000000004, v=[0, 1, 0]) {
                  rotate (a=7.999999999999999, v=[1, 0, 0]) {
                    translate ([-8.524999999999999, 8.524999999999999, 0]) {
                      translate ([0, 0, 2]) {
                        cube ([0.1, 0.1, 4], center=true);
                      }
                    }
                  }
                }
              }
            }
          }
          translate ([-46, -22, -7]) {
            translate ([-36.42059678255161, -13.748592644796744, 45.42143047760381]) {
              rotate (a=34.99999999999999, v=[0, 0, 1]) {
                rotate (a=-36.0, v=[0, 1, 0]) {
                  rotate (a=1.9999999999999998, v=[1, 0, 0]) {
                    translate ([8.524999999999999, 8.524999999999999, 0]) {
                      translate ([0, 0, 2]) {
                        cube ([0.1, 0.1, 4], center=true);
                      }
                    }
                  }
                }
              }
            }
          }
          translate ([-31, -13, 3]) {
            translate ([-36.42059678255161, -13.748592644796744, 45.42143047760381]) {
              rotate (a=25.0, v=[0, 0, 1]) {
                rotate (a=-23.000000000000004, v=[0, 1, 0]) {
                  rotate (a=7.999999999999999, v=[1, 0, 0]) {
                    translate ([-8.524999999999999, -8.524999999999999, 0]) {
                      translate ([0, 0, 2]) {
                        cube ([0.1, 0.1, 4], center=true);
                      }
                    }
                  }
                }
              }
            }
          }
        }
        hull () {
          translate ([-46, -22, -7]) {
            translate ([-36.42059678255161, -13.748592644796744, 45.42143047760381]) {
              rotate (a=34.99999999999999, v=[0, 0, 1]) {
                rotate (a=-36.0, v=[0, 1, 0]) {
                  rotate (a=1.9999999999999998, v=[1, 0, 0]) {
                    translate ([8.524999999999999, 8.524999999999999, 0]) {
                      translate ([0, 0, 2]) {
                        cube ([0.1, 0.1, 4], center=true);
                      }
                    }
                  }
                }
              }
            }
          }
          translate ([-31, -13, 3]) {
            translate ([-36.42059678255161, -13.748592644796744, 45.42143047760381]) {
              rotate (a=25.0, v=[0, 0, 1]) {
                rotate (a=-23.000000000000004, v=[0, 1, 0]) {
                  rotate (a=7.999999999999999, v=[1, 0, 0]) {
                    translate ([-8.524999999999999, -8.524999999999999, 0]) {
                      translate ([0, 0, 2]) {
                        cube ([0.1, 0.1, 4], center=true);
                      }
                    }
                  }
                }
              }
            }
          }
          translate ([-46, -22, -7]) {
            translate ([-36.42059678255161, -13.748592644796744, 45.42143047760381]) {
              rotate (a=34.99999999999999, v=[0, 0, 1]) {
                rotate (a=-36.0, v=[0, 1, 0]) {
                  rotate (a=1.9999999999999998, v=[1, 0, 0]) {
                    translate ([8.524999999999999, -8.524999999999999, 0]) {
                      translate ([0, 0, 2]) {
                        cube ([0.1, 0.1, 4], center=true);
                      }
                    }
                  }
                }
              }
            }
          }
        }
        hull () {
          translate ([-31, -13, 3]) {
            translate ([-36.42059678255161, -13.748592644796744, 45.42143047760381]) {
              rotate (a=25.0, v=[0, 0, 1]) {
                rotate (a=-23.000000000000004, v=[0, 1, 0]) {
                  rotate (a=7.999999999999999, v=[1, 0, 0]) {
                    translate ([-8.524999999999999, -8.524999999999999, 0]) {
                      translate ([0, 0, 2]) {
                        cube ([0.1, 0.1, 4], center=true);
                      }
                    }
                  }
                }
              }
            }
          }
          translate ([-46, -22, -7]) {
            translate ([-36.42059678255161, -13.748592644796744, 45.42143047760381]) {
              rotate (a=34.99999999999999, v=[0, 0, 1]) {
                rotate (a=-36.0, v=[0, 1, 0]) {
                  rotate (a=1.9999999999999998, v=[1, 0, 0]) {
                    translate ([8.524999999999999, -8.524999999999999, 0]) {
                      translate ([0, 0, 2]) {
                        cube ([0.1, 0.1, 4], center=true);
                      }
                    }
                  }
                }
              }
            }
          }
          translate ([-22, -36, -3]) {
            translate ([-36.42059678255161, -13.748592644796744, 45.42143047760381]) {
              rotate (a=25.0, v=[0, 0, 1]) {
                rotate (a=-23.000000000000004, v=[0, 1, 0]) {
                  rotate (a=-1.9999999999999998, v=[1, 0, 0]) {
                    translate ([8.524999999999999, 8.524999999999999, 0]) {
                      translate ([0, 0, 2]) {
                        cube ([0.1, 0.1, 4], center=true);
                      }
                    }
                  }
                }
              }
            }
          }
        }
        hull () {
          translate ([-46, -22, -7]) {
            translate ([-36.42059678255161, -13.748592644796744, 45.42143047760381]) {
              rotate (a=34.99999999999999, v=[0, 0, 1]) {
                rotate (a=-36.0, v=[0, 1, 0]) {
                  rotate (a=1.9999999999999998, v=[1, 0, 0]) {
                    translate ([8.524999999999999, -8.524999999999999, 0]) {
                      translate ([0, 0, 2]) {
                        cube ([0.1, 0.1, 4], center=true);
                      }
                    }
                  }
                }
              }
            }
          }
          translate ([-22, -36, -3]) {
            translate ([-36.42059678255161, -13.748592644796744, 45.42143047760381]) {
              rotate (a=25.0, v=[0, 0, 1]) {
                rotate (a=-23.000000000000004, v=[0, 1, 0]) {
                  rotate (a=-1.9999999999999998, v=[1, 0, 0]) {
                    translate ([8.524999999999999, 8.524999999999999, 0]) {
                      translate ([0, 0, 2]) {
                        cube ([0.1, 0.1, 4], center=true);
                      }
                    }
                  }
                }
              }
            }
          }
          translate ([-31, -13, 3]) {
            translate ([-36.42059678255161, -13.748592644796744, 45.42143047760381]) {
              rotate (a=25.0, v=[0, 0, 1]) {
                rotate (a=-23.000000000000004, v=[0, 1, 0]) {
                  rotate (a=7.999999999999999, v=[1, 0, 0]) {
                    translate ([-8.524999999999999, -8.524999999999999, 0]) {
                      translate ([0, 0, 2]) {
                        cube ([0.1, 0.1, 4], center=true);
                      }
                    }
                  }
                }
              }
            }
          }
        }
        hull () {
          translate ([-22, -36, -3]) {
            translate ([-36.42059678255161, -13.748592644796744, 45.42143047760381]) {
              rotate (a=25.0, v=[0, 0, 1]) {
                rotate (a=-23.000000000000004, v=[0, 1, 0]) {
                  rotate (a=-1.9999999999999998, v=[1, 0, 0]) {
                    translate ([8.524999999999999, 8.524999999999999, 0]) {
                      translate ([0, 0, 2]) {
                        cube ([0.1, 0.1, 4], center=true);
                      }
                    }
                  }
                }
              }
            }
          }
          translate ([-31, -13, 3]) {
            translate ([-36.42059678255161, -13.748592644796744, 45.42143047760381]) {
              rotate (a=25.0, v=[0, 0, 1]) {
                rotate (a=-23.000000000000004, v=[0, 1, 0]) {
                  rotate (a=7.999999999999999, v=[1, 0, 0]) {
                    translate ([-8.524999999999999, -8.524999999999999, 0]) {
                      translate ([0, 0, 2]) {
                        cube ([0.1, 0.1, 4], center=true);
                      }
                    }
                  }
                }
              }
            }
          }
          translate ([-31, -13, 3]) {
            translate ([-36.42059678255161, -13.748592644796744, 45.42143047760381]) {
              rotate (a=25.0, v=[0, 0, 1]) {
                rotate (a=-23.000000000000004, v=[0, 1, 0]) {
                  rotate (a=7.999999999999999, v=[1, 0, 0]) {
                    translate ([8.524999999999999, -8.524999999999999, 0]) {
                      translate ([0, 0, 2]) {
                        cube ([0.1, 0.1, 4], center=true);
                      }
                    }
                  }
                }
              }
            }
          }
        }
        hull () {
          translate ([-31, -13, 3]) {
            translate ([-36.42059678255161, -13.748592644796744, 45.42143047760381]) {
              rotate (a=25.0, v=[0, 0, 1]) {
                rotate (a=-23.000000000000004, v=[0, 1, 0]) {
                  rotate (a=7.999999999999999, v=[1, 0, 0]) {
                    translate ([-8.524999999999999, -8.524999999999999, 0]) {
                      translate ([0, 0, 2]) {
                        cube ([0.1, 0.1, 4], center=true);
                      }
                    }
                  }
                }
              }
            }
          }
          translate ([-31, -13, 3]) {
            translate ([-36.42059678255161, -13.748592644796744, 45.42143047760381]) {
              rotate (a=25.0, v=[0, 0, 1]) {
                rotate (a=-23.000000000000004, v=[0, 1, 0]) {
                  rotate (a=7.999999999999999, v=[1, 0, 0]) {
                    translate ([8.524999999999999, -8.524999999999999, 0]) {
                      translate ([0, 0, 2]) {
                        cube ([0.1, 0.1, 4], center=true);
                      }
                    }
                  }
                }
              }
            }
          }
          translate ([-22, -36, -3]) {
            translate ([-36.42059678255161, -13.748592644796744, 45.42143047760381]) {
              rotate (a=25.0, v=[0, 0, 1]) {
                rotate (a=-23.000000000000004, v=[0, 1, 0]) {
                  rotate (a=-1.9999999999999998, v=[1, 0, 0]) {
                    translate ([8.524999999999999, 8.524999999999999, 0]) {
                      translate ([0, 0, 2]) {
                        cube ([0.1, 0.1, 4], center=true);
                      }
                    }
                  }
                }
              }
            }
          }
        }
      }
    }
  }
  union () {
    translate ([-22, -36, -3]) {
      translate ([-36.42059678255161, -13.748592644796744, 45.42143047760381]) {
        rotate (a=25.0, v=[0, 0, 1]) {
          rotate (a=-23.000000000000004, v=[0, 1, 0]) {
            rotate (a=-1.9999999999999998, v=[1, 0, 0]) {
              difference () {
                hull () {
                  hull () {
                    translate ([-8.524999999999999, -8.524999999999999, 0]) {
                      translate ([0, 0, 2]) {
                        cube ([0.1, 0.1, 4], center=true);
                      }
                    }
                    translate ([8.524999999999999, -8.524999999999999, 0]) {
                      translate ([0, 0, 2]) {
                        cube ([0.1, 0.1, 4], center=true);
                      }
                    }
                  }
                  translate ([0, 0, 2]) {
                    translate ([0, -13.575, 0]) {
                      cylinder (h=4, r=4, center=true);
                    }
                  }
                }
                translate ([0, 0, 2]) {
                  translate ([0, -13.575, 0]) {
                    cylinder ($fn=30, h=6, r=1.65, center=true);
                  }
                }
              }
            }
          }
        }
      }
    }
    translate ([-46, -22, -7]) {
      translate ([-36.42059678255161, -13.748592644796744, 45.42143047760381]) {
        rotate (a=34.99999999999999, v=[0, 0, 1]) {
          rotate (a=-36.0, v=[0, 1, 0]) {
            rotate (a=1.9999999999999998, v=[1, 0, 0]) {
              difference () {
                hull () {
                  hull () {
                    translate ([-8.524999999999999, 8.524999999999999, 0]) {
                      translate ([0, 0, 2]) {
                        cube ([0.1, 0.1, 4], center=true);
                      }
                    }
                    translate ([8.524999999999999, 8.524999999999999, 0]) {
                      translate ([0, 0, 2]) {
                        cube ([0.1, 0.1, 4], center=true);
                      }
                    }
                  }
                  translate ([0, 0, 2]) {
                    translate ([0, 13.575, 0]) {
                      cylinder (h=4, r=4, center=true);
                    }
                  }
                }
                translate ([0, 0, 2]) {
                  translate ([0, 13.575, 0]) {
                    cylinder ($fn=30, h=6, r=1.65, center=true);
                  }
                }
              }
            }
          }
        }
      }
    }
  }
}
